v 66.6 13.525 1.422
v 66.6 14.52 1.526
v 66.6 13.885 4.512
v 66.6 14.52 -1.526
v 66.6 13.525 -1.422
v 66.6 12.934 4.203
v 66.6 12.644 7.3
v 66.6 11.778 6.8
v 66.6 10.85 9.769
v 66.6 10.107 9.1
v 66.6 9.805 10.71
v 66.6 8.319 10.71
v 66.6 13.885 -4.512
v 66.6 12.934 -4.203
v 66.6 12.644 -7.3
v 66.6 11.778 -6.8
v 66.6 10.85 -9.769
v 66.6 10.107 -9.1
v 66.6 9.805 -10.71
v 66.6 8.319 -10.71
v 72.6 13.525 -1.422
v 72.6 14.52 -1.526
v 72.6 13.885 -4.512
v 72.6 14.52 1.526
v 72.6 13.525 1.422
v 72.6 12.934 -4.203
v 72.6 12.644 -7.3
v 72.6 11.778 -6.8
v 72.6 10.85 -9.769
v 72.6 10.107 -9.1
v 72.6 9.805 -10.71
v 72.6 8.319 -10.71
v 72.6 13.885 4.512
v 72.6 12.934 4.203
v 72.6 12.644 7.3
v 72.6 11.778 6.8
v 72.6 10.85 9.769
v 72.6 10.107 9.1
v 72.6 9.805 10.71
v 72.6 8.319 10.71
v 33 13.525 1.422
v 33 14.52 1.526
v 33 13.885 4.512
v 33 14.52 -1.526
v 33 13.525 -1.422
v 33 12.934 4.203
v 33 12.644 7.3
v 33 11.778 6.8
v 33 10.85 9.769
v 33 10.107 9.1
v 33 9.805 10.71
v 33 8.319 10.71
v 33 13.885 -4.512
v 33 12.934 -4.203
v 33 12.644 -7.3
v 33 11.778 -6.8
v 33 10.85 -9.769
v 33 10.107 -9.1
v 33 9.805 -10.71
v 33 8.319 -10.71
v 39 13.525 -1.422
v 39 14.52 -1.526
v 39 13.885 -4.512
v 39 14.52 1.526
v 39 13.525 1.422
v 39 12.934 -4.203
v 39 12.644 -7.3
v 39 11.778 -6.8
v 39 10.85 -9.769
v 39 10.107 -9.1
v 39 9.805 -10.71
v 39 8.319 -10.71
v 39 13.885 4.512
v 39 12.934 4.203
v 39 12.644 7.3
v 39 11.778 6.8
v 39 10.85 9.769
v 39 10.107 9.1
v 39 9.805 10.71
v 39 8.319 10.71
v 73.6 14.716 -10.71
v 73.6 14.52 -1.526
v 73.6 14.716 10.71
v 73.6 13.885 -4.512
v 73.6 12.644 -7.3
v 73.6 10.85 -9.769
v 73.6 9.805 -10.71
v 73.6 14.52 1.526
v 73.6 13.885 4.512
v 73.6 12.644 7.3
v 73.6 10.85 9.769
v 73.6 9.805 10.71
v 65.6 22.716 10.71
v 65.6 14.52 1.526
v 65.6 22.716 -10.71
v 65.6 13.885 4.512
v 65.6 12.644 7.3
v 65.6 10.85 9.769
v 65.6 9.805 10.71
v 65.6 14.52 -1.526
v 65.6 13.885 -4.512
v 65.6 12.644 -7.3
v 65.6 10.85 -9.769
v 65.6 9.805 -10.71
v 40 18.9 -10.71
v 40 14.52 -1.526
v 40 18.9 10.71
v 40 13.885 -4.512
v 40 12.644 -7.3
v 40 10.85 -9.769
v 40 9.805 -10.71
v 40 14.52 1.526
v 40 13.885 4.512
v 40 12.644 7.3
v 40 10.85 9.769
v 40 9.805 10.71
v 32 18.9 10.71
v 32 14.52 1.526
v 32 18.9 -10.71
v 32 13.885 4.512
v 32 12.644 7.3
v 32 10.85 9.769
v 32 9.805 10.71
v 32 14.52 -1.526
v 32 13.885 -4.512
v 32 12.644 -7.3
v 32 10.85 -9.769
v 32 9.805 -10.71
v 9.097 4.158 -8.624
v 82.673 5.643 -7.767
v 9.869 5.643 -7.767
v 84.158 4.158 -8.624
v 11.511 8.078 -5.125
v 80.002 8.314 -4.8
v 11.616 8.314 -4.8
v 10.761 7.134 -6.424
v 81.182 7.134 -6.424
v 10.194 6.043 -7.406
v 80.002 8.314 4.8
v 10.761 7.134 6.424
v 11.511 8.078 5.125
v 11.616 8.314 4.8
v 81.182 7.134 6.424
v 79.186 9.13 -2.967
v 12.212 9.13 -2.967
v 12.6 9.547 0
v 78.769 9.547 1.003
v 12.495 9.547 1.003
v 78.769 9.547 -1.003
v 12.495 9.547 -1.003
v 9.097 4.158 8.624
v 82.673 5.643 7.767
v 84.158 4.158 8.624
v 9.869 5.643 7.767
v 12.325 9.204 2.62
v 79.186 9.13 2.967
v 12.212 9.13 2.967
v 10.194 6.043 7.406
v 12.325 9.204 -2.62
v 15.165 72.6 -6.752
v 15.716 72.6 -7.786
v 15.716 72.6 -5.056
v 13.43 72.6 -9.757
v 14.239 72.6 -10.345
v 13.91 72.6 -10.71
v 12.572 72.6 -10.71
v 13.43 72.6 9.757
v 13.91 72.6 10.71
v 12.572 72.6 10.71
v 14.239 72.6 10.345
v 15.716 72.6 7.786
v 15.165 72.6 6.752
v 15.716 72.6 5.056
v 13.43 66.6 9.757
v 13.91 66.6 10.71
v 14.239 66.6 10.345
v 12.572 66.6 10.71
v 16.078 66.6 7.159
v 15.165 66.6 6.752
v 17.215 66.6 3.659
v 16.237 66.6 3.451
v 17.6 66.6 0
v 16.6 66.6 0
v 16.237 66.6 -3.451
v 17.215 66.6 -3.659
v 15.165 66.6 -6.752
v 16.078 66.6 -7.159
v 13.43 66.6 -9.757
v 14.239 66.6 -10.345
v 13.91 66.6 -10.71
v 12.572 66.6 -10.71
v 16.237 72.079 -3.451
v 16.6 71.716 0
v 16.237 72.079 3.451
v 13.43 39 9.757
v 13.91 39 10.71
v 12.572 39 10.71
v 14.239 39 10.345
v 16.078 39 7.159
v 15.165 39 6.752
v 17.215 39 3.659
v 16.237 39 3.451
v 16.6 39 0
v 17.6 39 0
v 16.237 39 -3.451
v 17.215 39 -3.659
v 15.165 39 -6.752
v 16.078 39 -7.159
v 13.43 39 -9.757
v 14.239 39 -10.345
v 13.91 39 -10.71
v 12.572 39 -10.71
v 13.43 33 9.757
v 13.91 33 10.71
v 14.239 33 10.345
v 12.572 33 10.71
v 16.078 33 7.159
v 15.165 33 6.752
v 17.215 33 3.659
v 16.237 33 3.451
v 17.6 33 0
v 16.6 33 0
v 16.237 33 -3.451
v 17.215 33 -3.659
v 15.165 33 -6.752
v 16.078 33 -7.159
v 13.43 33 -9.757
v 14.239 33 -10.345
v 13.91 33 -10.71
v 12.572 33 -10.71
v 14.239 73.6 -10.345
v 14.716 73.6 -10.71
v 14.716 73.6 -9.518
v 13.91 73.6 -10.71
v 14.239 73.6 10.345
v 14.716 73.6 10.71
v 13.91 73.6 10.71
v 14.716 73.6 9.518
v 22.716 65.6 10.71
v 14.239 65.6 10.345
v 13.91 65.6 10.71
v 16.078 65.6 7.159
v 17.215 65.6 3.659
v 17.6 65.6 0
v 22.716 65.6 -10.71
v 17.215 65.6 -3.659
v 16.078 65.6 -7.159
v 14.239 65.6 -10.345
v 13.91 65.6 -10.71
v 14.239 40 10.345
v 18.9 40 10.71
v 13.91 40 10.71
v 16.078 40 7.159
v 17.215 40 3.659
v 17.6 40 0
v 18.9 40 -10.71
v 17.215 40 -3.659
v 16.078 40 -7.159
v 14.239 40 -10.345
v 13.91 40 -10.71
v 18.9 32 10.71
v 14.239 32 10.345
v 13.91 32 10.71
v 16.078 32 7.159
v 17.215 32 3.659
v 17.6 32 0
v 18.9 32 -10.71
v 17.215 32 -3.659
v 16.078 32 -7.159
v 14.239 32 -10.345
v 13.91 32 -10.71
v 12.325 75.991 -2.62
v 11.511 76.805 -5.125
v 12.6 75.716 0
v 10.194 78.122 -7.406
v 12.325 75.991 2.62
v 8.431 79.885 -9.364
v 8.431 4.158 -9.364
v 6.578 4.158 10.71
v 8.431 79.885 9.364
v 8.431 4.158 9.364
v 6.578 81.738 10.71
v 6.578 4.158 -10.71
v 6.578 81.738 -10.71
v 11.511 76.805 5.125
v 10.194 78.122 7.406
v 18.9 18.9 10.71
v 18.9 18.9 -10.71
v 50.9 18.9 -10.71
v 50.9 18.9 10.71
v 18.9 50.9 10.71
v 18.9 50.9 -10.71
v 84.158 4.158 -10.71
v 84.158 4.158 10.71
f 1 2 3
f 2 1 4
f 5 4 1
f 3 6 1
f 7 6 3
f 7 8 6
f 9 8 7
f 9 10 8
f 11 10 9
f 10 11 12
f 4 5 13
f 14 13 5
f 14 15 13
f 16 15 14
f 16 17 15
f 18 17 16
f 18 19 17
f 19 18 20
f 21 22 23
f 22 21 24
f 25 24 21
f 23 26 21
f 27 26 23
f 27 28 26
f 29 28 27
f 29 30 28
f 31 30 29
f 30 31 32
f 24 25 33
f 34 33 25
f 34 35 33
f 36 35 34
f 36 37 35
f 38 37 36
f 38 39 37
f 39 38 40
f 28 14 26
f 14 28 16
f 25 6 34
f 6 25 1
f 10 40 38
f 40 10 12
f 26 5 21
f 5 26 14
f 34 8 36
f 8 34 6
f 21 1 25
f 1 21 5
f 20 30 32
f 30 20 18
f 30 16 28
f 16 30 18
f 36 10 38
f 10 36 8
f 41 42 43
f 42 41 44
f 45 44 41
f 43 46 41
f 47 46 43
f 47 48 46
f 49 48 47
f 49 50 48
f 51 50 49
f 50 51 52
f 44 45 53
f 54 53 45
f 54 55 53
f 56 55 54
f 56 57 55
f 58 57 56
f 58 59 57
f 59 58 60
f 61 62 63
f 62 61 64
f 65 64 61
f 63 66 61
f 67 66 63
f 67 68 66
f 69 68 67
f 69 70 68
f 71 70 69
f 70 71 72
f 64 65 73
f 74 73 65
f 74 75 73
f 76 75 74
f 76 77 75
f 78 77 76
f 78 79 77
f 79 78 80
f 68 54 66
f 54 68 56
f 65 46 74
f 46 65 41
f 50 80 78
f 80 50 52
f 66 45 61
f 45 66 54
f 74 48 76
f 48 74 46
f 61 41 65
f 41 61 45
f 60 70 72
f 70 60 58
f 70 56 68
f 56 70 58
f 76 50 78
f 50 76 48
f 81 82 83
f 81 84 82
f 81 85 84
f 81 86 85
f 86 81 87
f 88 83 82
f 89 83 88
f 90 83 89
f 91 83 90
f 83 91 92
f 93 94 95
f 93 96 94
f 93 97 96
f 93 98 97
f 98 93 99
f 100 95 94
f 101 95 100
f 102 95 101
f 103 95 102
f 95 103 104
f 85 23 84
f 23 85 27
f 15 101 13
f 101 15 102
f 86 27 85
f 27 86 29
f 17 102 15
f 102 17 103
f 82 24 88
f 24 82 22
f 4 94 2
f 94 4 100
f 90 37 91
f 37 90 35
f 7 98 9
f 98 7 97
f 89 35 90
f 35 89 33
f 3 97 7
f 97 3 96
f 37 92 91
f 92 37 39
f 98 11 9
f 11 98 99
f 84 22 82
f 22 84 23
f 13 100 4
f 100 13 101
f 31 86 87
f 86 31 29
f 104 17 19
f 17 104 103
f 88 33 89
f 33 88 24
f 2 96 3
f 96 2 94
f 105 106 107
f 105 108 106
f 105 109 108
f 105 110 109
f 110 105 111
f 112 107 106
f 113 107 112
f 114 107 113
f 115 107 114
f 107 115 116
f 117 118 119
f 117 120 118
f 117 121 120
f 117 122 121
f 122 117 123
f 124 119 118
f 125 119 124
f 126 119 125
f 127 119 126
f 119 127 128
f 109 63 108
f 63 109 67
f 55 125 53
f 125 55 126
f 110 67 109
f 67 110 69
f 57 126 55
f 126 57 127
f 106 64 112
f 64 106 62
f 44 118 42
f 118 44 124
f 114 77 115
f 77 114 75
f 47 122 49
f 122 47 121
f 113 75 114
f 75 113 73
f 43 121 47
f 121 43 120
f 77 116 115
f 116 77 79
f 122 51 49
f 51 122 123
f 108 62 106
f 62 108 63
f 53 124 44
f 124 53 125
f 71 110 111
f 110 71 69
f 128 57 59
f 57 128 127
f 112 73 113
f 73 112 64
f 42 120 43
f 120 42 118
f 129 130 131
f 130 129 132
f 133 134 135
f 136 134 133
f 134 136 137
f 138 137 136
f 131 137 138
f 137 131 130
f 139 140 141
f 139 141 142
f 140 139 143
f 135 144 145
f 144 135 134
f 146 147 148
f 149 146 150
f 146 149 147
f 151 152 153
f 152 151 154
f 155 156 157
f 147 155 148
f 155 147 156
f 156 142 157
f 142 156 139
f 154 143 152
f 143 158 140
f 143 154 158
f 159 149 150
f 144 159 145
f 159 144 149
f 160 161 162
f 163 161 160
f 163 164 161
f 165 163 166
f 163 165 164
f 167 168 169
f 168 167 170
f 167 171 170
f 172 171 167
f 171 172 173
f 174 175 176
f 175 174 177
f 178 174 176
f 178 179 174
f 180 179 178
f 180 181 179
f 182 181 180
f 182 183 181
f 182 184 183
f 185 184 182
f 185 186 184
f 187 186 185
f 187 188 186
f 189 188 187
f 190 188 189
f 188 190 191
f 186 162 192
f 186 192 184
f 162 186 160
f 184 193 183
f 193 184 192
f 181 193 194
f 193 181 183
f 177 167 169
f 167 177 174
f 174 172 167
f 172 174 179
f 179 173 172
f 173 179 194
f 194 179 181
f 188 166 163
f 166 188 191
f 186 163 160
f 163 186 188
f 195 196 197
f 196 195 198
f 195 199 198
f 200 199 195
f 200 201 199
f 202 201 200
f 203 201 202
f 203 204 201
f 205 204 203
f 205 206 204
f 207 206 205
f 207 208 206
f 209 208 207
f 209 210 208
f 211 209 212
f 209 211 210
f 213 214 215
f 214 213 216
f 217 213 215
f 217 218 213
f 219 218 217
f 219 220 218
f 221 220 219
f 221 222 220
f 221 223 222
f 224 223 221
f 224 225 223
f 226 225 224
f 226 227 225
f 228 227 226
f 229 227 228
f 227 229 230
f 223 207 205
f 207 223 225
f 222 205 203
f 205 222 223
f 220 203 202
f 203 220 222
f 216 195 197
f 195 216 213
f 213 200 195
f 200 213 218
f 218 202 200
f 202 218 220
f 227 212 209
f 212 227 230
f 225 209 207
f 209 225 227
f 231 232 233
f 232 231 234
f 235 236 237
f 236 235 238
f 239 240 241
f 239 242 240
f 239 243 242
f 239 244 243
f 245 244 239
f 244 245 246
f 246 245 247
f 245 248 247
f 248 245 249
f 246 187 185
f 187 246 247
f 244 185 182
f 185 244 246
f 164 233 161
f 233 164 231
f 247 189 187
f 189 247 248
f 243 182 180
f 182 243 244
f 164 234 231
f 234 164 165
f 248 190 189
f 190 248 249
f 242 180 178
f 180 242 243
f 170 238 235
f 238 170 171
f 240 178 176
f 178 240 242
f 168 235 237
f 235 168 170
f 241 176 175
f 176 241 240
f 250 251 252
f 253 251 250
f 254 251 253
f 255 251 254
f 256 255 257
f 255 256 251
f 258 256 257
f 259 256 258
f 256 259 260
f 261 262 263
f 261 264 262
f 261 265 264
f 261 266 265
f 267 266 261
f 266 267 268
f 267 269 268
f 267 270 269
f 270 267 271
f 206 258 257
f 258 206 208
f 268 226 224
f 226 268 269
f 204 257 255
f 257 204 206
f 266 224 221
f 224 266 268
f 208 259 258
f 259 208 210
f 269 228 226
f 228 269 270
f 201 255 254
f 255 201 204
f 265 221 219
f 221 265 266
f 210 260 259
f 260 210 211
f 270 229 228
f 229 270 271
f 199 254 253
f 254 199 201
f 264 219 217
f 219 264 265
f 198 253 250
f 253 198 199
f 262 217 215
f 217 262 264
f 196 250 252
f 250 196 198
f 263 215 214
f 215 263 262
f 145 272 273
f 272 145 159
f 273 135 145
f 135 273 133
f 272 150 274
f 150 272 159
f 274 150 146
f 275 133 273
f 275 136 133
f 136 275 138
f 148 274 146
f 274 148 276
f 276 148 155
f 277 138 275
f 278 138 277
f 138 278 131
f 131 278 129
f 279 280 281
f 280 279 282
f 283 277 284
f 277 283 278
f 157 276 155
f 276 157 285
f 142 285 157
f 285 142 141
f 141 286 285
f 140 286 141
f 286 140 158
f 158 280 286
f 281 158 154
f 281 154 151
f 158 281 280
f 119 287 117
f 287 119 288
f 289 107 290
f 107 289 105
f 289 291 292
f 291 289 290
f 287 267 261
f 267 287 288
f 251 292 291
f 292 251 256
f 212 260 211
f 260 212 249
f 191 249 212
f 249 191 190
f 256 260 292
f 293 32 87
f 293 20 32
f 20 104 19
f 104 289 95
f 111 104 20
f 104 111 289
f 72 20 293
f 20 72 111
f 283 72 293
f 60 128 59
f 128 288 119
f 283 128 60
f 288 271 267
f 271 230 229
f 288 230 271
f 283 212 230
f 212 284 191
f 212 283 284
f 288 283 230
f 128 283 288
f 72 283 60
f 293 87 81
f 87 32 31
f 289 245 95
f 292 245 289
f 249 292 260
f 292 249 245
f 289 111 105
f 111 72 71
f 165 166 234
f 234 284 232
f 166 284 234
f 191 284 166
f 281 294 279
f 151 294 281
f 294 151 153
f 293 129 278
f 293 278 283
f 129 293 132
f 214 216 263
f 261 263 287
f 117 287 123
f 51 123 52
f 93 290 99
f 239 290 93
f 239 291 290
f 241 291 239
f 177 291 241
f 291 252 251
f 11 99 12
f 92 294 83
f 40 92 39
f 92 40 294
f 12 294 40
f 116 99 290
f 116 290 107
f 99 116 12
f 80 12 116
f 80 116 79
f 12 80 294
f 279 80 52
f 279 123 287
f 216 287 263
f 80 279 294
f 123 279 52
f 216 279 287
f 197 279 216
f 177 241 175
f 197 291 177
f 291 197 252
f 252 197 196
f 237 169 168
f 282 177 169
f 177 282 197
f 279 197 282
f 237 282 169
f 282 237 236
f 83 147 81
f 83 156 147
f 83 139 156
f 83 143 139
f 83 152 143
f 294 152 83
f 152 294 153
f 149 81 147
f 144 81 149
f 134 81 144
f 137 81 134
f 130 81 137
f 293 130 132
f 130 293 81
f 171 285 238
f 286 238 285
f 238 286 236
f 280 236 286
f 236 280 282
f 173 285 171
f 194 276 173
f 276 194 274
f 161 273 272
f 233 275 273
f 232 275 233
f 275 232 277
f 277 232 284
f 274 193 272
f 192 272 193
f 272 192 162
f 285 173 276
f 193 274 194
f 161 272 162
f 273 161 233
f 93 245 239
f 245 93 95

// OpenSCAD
h = 80;
big_r = 12.6; // on x axis
sm_r = 9.6;  // on y axis

module isosceles_right_triangle(leg){
    polygon(
        points=[[0, 0],
                [0, leg],
                [leg, 0]]);
    }

module ir_tri_extrude(h, leg){
    linear_extrude(height=h) isosceles_right_triangle(leg);
    }

module ring(r_out, r_in, h){
    translate([0, 0, -h/2]) difference(){
        cylinder(r=r_out, h=h);
        translate([0, 0, h * -0.1]) cylinder(r=r_in, h=h* 1.2);
        }
    }

module zip_ring(r_in, z_offset, h=3){
        translate([0, 0, z_offset]) ring(r_out=r_in + 12, r_in=r_in, h=h);
    }

module fit_pipe_n_zip(r, h, rel_z_offset=0.87, rel_z_offset2=0.45,
                        zip_space1=4, zip_space2=5, zip_h1=6, zip_h2=8){

        union(){
            cylinder(r=r, h=h * 2);
            zip_ring(r_in=r + zip_space1, z_offset=h * rel_z_offset, h=zip_h1);
            zip_ring(r_in=r + zip_space1, z_offset=h * rel_z_offset2, h=zip_h1);
            zip_ring(r_in=r + zip_space2, z_offset=h * rel_z_offset, h=zip_h2);
            zip_ring(r_in=r + zip_space2, z_offset=h * rel_z_offset2, h=zip_h2);
            };
        }
  
module fin_brace(){       
    difference(){
        translate([big_r * 0.33, big_r * 0.33, -big_r * 1.7 / 2]) ir_tri_extrude(big_r * 1.7, h);
        union(){
            // empty middle
            translate([big_r * 1.5, big_r * 1.5, -big_r * 1.1]) ir_tri_extrude(big_r * 2.2, h /2.5 );
            // y axis
            rotate([0, 90, 0]) fit_pipe_n_zip(r=sm_r, h=h);
            // x axis
            rotate([-90, 0, 0]) fit_pipe_n_zip(r=big_r, h=h);
            }
        }
    }

// uncomment intersection bits to get a quicker fit test
//intersection(){
fin_brace();
//translate([0, 0, -big_r]) ir_tri_extrude(big_r * 2, 40);
//}
